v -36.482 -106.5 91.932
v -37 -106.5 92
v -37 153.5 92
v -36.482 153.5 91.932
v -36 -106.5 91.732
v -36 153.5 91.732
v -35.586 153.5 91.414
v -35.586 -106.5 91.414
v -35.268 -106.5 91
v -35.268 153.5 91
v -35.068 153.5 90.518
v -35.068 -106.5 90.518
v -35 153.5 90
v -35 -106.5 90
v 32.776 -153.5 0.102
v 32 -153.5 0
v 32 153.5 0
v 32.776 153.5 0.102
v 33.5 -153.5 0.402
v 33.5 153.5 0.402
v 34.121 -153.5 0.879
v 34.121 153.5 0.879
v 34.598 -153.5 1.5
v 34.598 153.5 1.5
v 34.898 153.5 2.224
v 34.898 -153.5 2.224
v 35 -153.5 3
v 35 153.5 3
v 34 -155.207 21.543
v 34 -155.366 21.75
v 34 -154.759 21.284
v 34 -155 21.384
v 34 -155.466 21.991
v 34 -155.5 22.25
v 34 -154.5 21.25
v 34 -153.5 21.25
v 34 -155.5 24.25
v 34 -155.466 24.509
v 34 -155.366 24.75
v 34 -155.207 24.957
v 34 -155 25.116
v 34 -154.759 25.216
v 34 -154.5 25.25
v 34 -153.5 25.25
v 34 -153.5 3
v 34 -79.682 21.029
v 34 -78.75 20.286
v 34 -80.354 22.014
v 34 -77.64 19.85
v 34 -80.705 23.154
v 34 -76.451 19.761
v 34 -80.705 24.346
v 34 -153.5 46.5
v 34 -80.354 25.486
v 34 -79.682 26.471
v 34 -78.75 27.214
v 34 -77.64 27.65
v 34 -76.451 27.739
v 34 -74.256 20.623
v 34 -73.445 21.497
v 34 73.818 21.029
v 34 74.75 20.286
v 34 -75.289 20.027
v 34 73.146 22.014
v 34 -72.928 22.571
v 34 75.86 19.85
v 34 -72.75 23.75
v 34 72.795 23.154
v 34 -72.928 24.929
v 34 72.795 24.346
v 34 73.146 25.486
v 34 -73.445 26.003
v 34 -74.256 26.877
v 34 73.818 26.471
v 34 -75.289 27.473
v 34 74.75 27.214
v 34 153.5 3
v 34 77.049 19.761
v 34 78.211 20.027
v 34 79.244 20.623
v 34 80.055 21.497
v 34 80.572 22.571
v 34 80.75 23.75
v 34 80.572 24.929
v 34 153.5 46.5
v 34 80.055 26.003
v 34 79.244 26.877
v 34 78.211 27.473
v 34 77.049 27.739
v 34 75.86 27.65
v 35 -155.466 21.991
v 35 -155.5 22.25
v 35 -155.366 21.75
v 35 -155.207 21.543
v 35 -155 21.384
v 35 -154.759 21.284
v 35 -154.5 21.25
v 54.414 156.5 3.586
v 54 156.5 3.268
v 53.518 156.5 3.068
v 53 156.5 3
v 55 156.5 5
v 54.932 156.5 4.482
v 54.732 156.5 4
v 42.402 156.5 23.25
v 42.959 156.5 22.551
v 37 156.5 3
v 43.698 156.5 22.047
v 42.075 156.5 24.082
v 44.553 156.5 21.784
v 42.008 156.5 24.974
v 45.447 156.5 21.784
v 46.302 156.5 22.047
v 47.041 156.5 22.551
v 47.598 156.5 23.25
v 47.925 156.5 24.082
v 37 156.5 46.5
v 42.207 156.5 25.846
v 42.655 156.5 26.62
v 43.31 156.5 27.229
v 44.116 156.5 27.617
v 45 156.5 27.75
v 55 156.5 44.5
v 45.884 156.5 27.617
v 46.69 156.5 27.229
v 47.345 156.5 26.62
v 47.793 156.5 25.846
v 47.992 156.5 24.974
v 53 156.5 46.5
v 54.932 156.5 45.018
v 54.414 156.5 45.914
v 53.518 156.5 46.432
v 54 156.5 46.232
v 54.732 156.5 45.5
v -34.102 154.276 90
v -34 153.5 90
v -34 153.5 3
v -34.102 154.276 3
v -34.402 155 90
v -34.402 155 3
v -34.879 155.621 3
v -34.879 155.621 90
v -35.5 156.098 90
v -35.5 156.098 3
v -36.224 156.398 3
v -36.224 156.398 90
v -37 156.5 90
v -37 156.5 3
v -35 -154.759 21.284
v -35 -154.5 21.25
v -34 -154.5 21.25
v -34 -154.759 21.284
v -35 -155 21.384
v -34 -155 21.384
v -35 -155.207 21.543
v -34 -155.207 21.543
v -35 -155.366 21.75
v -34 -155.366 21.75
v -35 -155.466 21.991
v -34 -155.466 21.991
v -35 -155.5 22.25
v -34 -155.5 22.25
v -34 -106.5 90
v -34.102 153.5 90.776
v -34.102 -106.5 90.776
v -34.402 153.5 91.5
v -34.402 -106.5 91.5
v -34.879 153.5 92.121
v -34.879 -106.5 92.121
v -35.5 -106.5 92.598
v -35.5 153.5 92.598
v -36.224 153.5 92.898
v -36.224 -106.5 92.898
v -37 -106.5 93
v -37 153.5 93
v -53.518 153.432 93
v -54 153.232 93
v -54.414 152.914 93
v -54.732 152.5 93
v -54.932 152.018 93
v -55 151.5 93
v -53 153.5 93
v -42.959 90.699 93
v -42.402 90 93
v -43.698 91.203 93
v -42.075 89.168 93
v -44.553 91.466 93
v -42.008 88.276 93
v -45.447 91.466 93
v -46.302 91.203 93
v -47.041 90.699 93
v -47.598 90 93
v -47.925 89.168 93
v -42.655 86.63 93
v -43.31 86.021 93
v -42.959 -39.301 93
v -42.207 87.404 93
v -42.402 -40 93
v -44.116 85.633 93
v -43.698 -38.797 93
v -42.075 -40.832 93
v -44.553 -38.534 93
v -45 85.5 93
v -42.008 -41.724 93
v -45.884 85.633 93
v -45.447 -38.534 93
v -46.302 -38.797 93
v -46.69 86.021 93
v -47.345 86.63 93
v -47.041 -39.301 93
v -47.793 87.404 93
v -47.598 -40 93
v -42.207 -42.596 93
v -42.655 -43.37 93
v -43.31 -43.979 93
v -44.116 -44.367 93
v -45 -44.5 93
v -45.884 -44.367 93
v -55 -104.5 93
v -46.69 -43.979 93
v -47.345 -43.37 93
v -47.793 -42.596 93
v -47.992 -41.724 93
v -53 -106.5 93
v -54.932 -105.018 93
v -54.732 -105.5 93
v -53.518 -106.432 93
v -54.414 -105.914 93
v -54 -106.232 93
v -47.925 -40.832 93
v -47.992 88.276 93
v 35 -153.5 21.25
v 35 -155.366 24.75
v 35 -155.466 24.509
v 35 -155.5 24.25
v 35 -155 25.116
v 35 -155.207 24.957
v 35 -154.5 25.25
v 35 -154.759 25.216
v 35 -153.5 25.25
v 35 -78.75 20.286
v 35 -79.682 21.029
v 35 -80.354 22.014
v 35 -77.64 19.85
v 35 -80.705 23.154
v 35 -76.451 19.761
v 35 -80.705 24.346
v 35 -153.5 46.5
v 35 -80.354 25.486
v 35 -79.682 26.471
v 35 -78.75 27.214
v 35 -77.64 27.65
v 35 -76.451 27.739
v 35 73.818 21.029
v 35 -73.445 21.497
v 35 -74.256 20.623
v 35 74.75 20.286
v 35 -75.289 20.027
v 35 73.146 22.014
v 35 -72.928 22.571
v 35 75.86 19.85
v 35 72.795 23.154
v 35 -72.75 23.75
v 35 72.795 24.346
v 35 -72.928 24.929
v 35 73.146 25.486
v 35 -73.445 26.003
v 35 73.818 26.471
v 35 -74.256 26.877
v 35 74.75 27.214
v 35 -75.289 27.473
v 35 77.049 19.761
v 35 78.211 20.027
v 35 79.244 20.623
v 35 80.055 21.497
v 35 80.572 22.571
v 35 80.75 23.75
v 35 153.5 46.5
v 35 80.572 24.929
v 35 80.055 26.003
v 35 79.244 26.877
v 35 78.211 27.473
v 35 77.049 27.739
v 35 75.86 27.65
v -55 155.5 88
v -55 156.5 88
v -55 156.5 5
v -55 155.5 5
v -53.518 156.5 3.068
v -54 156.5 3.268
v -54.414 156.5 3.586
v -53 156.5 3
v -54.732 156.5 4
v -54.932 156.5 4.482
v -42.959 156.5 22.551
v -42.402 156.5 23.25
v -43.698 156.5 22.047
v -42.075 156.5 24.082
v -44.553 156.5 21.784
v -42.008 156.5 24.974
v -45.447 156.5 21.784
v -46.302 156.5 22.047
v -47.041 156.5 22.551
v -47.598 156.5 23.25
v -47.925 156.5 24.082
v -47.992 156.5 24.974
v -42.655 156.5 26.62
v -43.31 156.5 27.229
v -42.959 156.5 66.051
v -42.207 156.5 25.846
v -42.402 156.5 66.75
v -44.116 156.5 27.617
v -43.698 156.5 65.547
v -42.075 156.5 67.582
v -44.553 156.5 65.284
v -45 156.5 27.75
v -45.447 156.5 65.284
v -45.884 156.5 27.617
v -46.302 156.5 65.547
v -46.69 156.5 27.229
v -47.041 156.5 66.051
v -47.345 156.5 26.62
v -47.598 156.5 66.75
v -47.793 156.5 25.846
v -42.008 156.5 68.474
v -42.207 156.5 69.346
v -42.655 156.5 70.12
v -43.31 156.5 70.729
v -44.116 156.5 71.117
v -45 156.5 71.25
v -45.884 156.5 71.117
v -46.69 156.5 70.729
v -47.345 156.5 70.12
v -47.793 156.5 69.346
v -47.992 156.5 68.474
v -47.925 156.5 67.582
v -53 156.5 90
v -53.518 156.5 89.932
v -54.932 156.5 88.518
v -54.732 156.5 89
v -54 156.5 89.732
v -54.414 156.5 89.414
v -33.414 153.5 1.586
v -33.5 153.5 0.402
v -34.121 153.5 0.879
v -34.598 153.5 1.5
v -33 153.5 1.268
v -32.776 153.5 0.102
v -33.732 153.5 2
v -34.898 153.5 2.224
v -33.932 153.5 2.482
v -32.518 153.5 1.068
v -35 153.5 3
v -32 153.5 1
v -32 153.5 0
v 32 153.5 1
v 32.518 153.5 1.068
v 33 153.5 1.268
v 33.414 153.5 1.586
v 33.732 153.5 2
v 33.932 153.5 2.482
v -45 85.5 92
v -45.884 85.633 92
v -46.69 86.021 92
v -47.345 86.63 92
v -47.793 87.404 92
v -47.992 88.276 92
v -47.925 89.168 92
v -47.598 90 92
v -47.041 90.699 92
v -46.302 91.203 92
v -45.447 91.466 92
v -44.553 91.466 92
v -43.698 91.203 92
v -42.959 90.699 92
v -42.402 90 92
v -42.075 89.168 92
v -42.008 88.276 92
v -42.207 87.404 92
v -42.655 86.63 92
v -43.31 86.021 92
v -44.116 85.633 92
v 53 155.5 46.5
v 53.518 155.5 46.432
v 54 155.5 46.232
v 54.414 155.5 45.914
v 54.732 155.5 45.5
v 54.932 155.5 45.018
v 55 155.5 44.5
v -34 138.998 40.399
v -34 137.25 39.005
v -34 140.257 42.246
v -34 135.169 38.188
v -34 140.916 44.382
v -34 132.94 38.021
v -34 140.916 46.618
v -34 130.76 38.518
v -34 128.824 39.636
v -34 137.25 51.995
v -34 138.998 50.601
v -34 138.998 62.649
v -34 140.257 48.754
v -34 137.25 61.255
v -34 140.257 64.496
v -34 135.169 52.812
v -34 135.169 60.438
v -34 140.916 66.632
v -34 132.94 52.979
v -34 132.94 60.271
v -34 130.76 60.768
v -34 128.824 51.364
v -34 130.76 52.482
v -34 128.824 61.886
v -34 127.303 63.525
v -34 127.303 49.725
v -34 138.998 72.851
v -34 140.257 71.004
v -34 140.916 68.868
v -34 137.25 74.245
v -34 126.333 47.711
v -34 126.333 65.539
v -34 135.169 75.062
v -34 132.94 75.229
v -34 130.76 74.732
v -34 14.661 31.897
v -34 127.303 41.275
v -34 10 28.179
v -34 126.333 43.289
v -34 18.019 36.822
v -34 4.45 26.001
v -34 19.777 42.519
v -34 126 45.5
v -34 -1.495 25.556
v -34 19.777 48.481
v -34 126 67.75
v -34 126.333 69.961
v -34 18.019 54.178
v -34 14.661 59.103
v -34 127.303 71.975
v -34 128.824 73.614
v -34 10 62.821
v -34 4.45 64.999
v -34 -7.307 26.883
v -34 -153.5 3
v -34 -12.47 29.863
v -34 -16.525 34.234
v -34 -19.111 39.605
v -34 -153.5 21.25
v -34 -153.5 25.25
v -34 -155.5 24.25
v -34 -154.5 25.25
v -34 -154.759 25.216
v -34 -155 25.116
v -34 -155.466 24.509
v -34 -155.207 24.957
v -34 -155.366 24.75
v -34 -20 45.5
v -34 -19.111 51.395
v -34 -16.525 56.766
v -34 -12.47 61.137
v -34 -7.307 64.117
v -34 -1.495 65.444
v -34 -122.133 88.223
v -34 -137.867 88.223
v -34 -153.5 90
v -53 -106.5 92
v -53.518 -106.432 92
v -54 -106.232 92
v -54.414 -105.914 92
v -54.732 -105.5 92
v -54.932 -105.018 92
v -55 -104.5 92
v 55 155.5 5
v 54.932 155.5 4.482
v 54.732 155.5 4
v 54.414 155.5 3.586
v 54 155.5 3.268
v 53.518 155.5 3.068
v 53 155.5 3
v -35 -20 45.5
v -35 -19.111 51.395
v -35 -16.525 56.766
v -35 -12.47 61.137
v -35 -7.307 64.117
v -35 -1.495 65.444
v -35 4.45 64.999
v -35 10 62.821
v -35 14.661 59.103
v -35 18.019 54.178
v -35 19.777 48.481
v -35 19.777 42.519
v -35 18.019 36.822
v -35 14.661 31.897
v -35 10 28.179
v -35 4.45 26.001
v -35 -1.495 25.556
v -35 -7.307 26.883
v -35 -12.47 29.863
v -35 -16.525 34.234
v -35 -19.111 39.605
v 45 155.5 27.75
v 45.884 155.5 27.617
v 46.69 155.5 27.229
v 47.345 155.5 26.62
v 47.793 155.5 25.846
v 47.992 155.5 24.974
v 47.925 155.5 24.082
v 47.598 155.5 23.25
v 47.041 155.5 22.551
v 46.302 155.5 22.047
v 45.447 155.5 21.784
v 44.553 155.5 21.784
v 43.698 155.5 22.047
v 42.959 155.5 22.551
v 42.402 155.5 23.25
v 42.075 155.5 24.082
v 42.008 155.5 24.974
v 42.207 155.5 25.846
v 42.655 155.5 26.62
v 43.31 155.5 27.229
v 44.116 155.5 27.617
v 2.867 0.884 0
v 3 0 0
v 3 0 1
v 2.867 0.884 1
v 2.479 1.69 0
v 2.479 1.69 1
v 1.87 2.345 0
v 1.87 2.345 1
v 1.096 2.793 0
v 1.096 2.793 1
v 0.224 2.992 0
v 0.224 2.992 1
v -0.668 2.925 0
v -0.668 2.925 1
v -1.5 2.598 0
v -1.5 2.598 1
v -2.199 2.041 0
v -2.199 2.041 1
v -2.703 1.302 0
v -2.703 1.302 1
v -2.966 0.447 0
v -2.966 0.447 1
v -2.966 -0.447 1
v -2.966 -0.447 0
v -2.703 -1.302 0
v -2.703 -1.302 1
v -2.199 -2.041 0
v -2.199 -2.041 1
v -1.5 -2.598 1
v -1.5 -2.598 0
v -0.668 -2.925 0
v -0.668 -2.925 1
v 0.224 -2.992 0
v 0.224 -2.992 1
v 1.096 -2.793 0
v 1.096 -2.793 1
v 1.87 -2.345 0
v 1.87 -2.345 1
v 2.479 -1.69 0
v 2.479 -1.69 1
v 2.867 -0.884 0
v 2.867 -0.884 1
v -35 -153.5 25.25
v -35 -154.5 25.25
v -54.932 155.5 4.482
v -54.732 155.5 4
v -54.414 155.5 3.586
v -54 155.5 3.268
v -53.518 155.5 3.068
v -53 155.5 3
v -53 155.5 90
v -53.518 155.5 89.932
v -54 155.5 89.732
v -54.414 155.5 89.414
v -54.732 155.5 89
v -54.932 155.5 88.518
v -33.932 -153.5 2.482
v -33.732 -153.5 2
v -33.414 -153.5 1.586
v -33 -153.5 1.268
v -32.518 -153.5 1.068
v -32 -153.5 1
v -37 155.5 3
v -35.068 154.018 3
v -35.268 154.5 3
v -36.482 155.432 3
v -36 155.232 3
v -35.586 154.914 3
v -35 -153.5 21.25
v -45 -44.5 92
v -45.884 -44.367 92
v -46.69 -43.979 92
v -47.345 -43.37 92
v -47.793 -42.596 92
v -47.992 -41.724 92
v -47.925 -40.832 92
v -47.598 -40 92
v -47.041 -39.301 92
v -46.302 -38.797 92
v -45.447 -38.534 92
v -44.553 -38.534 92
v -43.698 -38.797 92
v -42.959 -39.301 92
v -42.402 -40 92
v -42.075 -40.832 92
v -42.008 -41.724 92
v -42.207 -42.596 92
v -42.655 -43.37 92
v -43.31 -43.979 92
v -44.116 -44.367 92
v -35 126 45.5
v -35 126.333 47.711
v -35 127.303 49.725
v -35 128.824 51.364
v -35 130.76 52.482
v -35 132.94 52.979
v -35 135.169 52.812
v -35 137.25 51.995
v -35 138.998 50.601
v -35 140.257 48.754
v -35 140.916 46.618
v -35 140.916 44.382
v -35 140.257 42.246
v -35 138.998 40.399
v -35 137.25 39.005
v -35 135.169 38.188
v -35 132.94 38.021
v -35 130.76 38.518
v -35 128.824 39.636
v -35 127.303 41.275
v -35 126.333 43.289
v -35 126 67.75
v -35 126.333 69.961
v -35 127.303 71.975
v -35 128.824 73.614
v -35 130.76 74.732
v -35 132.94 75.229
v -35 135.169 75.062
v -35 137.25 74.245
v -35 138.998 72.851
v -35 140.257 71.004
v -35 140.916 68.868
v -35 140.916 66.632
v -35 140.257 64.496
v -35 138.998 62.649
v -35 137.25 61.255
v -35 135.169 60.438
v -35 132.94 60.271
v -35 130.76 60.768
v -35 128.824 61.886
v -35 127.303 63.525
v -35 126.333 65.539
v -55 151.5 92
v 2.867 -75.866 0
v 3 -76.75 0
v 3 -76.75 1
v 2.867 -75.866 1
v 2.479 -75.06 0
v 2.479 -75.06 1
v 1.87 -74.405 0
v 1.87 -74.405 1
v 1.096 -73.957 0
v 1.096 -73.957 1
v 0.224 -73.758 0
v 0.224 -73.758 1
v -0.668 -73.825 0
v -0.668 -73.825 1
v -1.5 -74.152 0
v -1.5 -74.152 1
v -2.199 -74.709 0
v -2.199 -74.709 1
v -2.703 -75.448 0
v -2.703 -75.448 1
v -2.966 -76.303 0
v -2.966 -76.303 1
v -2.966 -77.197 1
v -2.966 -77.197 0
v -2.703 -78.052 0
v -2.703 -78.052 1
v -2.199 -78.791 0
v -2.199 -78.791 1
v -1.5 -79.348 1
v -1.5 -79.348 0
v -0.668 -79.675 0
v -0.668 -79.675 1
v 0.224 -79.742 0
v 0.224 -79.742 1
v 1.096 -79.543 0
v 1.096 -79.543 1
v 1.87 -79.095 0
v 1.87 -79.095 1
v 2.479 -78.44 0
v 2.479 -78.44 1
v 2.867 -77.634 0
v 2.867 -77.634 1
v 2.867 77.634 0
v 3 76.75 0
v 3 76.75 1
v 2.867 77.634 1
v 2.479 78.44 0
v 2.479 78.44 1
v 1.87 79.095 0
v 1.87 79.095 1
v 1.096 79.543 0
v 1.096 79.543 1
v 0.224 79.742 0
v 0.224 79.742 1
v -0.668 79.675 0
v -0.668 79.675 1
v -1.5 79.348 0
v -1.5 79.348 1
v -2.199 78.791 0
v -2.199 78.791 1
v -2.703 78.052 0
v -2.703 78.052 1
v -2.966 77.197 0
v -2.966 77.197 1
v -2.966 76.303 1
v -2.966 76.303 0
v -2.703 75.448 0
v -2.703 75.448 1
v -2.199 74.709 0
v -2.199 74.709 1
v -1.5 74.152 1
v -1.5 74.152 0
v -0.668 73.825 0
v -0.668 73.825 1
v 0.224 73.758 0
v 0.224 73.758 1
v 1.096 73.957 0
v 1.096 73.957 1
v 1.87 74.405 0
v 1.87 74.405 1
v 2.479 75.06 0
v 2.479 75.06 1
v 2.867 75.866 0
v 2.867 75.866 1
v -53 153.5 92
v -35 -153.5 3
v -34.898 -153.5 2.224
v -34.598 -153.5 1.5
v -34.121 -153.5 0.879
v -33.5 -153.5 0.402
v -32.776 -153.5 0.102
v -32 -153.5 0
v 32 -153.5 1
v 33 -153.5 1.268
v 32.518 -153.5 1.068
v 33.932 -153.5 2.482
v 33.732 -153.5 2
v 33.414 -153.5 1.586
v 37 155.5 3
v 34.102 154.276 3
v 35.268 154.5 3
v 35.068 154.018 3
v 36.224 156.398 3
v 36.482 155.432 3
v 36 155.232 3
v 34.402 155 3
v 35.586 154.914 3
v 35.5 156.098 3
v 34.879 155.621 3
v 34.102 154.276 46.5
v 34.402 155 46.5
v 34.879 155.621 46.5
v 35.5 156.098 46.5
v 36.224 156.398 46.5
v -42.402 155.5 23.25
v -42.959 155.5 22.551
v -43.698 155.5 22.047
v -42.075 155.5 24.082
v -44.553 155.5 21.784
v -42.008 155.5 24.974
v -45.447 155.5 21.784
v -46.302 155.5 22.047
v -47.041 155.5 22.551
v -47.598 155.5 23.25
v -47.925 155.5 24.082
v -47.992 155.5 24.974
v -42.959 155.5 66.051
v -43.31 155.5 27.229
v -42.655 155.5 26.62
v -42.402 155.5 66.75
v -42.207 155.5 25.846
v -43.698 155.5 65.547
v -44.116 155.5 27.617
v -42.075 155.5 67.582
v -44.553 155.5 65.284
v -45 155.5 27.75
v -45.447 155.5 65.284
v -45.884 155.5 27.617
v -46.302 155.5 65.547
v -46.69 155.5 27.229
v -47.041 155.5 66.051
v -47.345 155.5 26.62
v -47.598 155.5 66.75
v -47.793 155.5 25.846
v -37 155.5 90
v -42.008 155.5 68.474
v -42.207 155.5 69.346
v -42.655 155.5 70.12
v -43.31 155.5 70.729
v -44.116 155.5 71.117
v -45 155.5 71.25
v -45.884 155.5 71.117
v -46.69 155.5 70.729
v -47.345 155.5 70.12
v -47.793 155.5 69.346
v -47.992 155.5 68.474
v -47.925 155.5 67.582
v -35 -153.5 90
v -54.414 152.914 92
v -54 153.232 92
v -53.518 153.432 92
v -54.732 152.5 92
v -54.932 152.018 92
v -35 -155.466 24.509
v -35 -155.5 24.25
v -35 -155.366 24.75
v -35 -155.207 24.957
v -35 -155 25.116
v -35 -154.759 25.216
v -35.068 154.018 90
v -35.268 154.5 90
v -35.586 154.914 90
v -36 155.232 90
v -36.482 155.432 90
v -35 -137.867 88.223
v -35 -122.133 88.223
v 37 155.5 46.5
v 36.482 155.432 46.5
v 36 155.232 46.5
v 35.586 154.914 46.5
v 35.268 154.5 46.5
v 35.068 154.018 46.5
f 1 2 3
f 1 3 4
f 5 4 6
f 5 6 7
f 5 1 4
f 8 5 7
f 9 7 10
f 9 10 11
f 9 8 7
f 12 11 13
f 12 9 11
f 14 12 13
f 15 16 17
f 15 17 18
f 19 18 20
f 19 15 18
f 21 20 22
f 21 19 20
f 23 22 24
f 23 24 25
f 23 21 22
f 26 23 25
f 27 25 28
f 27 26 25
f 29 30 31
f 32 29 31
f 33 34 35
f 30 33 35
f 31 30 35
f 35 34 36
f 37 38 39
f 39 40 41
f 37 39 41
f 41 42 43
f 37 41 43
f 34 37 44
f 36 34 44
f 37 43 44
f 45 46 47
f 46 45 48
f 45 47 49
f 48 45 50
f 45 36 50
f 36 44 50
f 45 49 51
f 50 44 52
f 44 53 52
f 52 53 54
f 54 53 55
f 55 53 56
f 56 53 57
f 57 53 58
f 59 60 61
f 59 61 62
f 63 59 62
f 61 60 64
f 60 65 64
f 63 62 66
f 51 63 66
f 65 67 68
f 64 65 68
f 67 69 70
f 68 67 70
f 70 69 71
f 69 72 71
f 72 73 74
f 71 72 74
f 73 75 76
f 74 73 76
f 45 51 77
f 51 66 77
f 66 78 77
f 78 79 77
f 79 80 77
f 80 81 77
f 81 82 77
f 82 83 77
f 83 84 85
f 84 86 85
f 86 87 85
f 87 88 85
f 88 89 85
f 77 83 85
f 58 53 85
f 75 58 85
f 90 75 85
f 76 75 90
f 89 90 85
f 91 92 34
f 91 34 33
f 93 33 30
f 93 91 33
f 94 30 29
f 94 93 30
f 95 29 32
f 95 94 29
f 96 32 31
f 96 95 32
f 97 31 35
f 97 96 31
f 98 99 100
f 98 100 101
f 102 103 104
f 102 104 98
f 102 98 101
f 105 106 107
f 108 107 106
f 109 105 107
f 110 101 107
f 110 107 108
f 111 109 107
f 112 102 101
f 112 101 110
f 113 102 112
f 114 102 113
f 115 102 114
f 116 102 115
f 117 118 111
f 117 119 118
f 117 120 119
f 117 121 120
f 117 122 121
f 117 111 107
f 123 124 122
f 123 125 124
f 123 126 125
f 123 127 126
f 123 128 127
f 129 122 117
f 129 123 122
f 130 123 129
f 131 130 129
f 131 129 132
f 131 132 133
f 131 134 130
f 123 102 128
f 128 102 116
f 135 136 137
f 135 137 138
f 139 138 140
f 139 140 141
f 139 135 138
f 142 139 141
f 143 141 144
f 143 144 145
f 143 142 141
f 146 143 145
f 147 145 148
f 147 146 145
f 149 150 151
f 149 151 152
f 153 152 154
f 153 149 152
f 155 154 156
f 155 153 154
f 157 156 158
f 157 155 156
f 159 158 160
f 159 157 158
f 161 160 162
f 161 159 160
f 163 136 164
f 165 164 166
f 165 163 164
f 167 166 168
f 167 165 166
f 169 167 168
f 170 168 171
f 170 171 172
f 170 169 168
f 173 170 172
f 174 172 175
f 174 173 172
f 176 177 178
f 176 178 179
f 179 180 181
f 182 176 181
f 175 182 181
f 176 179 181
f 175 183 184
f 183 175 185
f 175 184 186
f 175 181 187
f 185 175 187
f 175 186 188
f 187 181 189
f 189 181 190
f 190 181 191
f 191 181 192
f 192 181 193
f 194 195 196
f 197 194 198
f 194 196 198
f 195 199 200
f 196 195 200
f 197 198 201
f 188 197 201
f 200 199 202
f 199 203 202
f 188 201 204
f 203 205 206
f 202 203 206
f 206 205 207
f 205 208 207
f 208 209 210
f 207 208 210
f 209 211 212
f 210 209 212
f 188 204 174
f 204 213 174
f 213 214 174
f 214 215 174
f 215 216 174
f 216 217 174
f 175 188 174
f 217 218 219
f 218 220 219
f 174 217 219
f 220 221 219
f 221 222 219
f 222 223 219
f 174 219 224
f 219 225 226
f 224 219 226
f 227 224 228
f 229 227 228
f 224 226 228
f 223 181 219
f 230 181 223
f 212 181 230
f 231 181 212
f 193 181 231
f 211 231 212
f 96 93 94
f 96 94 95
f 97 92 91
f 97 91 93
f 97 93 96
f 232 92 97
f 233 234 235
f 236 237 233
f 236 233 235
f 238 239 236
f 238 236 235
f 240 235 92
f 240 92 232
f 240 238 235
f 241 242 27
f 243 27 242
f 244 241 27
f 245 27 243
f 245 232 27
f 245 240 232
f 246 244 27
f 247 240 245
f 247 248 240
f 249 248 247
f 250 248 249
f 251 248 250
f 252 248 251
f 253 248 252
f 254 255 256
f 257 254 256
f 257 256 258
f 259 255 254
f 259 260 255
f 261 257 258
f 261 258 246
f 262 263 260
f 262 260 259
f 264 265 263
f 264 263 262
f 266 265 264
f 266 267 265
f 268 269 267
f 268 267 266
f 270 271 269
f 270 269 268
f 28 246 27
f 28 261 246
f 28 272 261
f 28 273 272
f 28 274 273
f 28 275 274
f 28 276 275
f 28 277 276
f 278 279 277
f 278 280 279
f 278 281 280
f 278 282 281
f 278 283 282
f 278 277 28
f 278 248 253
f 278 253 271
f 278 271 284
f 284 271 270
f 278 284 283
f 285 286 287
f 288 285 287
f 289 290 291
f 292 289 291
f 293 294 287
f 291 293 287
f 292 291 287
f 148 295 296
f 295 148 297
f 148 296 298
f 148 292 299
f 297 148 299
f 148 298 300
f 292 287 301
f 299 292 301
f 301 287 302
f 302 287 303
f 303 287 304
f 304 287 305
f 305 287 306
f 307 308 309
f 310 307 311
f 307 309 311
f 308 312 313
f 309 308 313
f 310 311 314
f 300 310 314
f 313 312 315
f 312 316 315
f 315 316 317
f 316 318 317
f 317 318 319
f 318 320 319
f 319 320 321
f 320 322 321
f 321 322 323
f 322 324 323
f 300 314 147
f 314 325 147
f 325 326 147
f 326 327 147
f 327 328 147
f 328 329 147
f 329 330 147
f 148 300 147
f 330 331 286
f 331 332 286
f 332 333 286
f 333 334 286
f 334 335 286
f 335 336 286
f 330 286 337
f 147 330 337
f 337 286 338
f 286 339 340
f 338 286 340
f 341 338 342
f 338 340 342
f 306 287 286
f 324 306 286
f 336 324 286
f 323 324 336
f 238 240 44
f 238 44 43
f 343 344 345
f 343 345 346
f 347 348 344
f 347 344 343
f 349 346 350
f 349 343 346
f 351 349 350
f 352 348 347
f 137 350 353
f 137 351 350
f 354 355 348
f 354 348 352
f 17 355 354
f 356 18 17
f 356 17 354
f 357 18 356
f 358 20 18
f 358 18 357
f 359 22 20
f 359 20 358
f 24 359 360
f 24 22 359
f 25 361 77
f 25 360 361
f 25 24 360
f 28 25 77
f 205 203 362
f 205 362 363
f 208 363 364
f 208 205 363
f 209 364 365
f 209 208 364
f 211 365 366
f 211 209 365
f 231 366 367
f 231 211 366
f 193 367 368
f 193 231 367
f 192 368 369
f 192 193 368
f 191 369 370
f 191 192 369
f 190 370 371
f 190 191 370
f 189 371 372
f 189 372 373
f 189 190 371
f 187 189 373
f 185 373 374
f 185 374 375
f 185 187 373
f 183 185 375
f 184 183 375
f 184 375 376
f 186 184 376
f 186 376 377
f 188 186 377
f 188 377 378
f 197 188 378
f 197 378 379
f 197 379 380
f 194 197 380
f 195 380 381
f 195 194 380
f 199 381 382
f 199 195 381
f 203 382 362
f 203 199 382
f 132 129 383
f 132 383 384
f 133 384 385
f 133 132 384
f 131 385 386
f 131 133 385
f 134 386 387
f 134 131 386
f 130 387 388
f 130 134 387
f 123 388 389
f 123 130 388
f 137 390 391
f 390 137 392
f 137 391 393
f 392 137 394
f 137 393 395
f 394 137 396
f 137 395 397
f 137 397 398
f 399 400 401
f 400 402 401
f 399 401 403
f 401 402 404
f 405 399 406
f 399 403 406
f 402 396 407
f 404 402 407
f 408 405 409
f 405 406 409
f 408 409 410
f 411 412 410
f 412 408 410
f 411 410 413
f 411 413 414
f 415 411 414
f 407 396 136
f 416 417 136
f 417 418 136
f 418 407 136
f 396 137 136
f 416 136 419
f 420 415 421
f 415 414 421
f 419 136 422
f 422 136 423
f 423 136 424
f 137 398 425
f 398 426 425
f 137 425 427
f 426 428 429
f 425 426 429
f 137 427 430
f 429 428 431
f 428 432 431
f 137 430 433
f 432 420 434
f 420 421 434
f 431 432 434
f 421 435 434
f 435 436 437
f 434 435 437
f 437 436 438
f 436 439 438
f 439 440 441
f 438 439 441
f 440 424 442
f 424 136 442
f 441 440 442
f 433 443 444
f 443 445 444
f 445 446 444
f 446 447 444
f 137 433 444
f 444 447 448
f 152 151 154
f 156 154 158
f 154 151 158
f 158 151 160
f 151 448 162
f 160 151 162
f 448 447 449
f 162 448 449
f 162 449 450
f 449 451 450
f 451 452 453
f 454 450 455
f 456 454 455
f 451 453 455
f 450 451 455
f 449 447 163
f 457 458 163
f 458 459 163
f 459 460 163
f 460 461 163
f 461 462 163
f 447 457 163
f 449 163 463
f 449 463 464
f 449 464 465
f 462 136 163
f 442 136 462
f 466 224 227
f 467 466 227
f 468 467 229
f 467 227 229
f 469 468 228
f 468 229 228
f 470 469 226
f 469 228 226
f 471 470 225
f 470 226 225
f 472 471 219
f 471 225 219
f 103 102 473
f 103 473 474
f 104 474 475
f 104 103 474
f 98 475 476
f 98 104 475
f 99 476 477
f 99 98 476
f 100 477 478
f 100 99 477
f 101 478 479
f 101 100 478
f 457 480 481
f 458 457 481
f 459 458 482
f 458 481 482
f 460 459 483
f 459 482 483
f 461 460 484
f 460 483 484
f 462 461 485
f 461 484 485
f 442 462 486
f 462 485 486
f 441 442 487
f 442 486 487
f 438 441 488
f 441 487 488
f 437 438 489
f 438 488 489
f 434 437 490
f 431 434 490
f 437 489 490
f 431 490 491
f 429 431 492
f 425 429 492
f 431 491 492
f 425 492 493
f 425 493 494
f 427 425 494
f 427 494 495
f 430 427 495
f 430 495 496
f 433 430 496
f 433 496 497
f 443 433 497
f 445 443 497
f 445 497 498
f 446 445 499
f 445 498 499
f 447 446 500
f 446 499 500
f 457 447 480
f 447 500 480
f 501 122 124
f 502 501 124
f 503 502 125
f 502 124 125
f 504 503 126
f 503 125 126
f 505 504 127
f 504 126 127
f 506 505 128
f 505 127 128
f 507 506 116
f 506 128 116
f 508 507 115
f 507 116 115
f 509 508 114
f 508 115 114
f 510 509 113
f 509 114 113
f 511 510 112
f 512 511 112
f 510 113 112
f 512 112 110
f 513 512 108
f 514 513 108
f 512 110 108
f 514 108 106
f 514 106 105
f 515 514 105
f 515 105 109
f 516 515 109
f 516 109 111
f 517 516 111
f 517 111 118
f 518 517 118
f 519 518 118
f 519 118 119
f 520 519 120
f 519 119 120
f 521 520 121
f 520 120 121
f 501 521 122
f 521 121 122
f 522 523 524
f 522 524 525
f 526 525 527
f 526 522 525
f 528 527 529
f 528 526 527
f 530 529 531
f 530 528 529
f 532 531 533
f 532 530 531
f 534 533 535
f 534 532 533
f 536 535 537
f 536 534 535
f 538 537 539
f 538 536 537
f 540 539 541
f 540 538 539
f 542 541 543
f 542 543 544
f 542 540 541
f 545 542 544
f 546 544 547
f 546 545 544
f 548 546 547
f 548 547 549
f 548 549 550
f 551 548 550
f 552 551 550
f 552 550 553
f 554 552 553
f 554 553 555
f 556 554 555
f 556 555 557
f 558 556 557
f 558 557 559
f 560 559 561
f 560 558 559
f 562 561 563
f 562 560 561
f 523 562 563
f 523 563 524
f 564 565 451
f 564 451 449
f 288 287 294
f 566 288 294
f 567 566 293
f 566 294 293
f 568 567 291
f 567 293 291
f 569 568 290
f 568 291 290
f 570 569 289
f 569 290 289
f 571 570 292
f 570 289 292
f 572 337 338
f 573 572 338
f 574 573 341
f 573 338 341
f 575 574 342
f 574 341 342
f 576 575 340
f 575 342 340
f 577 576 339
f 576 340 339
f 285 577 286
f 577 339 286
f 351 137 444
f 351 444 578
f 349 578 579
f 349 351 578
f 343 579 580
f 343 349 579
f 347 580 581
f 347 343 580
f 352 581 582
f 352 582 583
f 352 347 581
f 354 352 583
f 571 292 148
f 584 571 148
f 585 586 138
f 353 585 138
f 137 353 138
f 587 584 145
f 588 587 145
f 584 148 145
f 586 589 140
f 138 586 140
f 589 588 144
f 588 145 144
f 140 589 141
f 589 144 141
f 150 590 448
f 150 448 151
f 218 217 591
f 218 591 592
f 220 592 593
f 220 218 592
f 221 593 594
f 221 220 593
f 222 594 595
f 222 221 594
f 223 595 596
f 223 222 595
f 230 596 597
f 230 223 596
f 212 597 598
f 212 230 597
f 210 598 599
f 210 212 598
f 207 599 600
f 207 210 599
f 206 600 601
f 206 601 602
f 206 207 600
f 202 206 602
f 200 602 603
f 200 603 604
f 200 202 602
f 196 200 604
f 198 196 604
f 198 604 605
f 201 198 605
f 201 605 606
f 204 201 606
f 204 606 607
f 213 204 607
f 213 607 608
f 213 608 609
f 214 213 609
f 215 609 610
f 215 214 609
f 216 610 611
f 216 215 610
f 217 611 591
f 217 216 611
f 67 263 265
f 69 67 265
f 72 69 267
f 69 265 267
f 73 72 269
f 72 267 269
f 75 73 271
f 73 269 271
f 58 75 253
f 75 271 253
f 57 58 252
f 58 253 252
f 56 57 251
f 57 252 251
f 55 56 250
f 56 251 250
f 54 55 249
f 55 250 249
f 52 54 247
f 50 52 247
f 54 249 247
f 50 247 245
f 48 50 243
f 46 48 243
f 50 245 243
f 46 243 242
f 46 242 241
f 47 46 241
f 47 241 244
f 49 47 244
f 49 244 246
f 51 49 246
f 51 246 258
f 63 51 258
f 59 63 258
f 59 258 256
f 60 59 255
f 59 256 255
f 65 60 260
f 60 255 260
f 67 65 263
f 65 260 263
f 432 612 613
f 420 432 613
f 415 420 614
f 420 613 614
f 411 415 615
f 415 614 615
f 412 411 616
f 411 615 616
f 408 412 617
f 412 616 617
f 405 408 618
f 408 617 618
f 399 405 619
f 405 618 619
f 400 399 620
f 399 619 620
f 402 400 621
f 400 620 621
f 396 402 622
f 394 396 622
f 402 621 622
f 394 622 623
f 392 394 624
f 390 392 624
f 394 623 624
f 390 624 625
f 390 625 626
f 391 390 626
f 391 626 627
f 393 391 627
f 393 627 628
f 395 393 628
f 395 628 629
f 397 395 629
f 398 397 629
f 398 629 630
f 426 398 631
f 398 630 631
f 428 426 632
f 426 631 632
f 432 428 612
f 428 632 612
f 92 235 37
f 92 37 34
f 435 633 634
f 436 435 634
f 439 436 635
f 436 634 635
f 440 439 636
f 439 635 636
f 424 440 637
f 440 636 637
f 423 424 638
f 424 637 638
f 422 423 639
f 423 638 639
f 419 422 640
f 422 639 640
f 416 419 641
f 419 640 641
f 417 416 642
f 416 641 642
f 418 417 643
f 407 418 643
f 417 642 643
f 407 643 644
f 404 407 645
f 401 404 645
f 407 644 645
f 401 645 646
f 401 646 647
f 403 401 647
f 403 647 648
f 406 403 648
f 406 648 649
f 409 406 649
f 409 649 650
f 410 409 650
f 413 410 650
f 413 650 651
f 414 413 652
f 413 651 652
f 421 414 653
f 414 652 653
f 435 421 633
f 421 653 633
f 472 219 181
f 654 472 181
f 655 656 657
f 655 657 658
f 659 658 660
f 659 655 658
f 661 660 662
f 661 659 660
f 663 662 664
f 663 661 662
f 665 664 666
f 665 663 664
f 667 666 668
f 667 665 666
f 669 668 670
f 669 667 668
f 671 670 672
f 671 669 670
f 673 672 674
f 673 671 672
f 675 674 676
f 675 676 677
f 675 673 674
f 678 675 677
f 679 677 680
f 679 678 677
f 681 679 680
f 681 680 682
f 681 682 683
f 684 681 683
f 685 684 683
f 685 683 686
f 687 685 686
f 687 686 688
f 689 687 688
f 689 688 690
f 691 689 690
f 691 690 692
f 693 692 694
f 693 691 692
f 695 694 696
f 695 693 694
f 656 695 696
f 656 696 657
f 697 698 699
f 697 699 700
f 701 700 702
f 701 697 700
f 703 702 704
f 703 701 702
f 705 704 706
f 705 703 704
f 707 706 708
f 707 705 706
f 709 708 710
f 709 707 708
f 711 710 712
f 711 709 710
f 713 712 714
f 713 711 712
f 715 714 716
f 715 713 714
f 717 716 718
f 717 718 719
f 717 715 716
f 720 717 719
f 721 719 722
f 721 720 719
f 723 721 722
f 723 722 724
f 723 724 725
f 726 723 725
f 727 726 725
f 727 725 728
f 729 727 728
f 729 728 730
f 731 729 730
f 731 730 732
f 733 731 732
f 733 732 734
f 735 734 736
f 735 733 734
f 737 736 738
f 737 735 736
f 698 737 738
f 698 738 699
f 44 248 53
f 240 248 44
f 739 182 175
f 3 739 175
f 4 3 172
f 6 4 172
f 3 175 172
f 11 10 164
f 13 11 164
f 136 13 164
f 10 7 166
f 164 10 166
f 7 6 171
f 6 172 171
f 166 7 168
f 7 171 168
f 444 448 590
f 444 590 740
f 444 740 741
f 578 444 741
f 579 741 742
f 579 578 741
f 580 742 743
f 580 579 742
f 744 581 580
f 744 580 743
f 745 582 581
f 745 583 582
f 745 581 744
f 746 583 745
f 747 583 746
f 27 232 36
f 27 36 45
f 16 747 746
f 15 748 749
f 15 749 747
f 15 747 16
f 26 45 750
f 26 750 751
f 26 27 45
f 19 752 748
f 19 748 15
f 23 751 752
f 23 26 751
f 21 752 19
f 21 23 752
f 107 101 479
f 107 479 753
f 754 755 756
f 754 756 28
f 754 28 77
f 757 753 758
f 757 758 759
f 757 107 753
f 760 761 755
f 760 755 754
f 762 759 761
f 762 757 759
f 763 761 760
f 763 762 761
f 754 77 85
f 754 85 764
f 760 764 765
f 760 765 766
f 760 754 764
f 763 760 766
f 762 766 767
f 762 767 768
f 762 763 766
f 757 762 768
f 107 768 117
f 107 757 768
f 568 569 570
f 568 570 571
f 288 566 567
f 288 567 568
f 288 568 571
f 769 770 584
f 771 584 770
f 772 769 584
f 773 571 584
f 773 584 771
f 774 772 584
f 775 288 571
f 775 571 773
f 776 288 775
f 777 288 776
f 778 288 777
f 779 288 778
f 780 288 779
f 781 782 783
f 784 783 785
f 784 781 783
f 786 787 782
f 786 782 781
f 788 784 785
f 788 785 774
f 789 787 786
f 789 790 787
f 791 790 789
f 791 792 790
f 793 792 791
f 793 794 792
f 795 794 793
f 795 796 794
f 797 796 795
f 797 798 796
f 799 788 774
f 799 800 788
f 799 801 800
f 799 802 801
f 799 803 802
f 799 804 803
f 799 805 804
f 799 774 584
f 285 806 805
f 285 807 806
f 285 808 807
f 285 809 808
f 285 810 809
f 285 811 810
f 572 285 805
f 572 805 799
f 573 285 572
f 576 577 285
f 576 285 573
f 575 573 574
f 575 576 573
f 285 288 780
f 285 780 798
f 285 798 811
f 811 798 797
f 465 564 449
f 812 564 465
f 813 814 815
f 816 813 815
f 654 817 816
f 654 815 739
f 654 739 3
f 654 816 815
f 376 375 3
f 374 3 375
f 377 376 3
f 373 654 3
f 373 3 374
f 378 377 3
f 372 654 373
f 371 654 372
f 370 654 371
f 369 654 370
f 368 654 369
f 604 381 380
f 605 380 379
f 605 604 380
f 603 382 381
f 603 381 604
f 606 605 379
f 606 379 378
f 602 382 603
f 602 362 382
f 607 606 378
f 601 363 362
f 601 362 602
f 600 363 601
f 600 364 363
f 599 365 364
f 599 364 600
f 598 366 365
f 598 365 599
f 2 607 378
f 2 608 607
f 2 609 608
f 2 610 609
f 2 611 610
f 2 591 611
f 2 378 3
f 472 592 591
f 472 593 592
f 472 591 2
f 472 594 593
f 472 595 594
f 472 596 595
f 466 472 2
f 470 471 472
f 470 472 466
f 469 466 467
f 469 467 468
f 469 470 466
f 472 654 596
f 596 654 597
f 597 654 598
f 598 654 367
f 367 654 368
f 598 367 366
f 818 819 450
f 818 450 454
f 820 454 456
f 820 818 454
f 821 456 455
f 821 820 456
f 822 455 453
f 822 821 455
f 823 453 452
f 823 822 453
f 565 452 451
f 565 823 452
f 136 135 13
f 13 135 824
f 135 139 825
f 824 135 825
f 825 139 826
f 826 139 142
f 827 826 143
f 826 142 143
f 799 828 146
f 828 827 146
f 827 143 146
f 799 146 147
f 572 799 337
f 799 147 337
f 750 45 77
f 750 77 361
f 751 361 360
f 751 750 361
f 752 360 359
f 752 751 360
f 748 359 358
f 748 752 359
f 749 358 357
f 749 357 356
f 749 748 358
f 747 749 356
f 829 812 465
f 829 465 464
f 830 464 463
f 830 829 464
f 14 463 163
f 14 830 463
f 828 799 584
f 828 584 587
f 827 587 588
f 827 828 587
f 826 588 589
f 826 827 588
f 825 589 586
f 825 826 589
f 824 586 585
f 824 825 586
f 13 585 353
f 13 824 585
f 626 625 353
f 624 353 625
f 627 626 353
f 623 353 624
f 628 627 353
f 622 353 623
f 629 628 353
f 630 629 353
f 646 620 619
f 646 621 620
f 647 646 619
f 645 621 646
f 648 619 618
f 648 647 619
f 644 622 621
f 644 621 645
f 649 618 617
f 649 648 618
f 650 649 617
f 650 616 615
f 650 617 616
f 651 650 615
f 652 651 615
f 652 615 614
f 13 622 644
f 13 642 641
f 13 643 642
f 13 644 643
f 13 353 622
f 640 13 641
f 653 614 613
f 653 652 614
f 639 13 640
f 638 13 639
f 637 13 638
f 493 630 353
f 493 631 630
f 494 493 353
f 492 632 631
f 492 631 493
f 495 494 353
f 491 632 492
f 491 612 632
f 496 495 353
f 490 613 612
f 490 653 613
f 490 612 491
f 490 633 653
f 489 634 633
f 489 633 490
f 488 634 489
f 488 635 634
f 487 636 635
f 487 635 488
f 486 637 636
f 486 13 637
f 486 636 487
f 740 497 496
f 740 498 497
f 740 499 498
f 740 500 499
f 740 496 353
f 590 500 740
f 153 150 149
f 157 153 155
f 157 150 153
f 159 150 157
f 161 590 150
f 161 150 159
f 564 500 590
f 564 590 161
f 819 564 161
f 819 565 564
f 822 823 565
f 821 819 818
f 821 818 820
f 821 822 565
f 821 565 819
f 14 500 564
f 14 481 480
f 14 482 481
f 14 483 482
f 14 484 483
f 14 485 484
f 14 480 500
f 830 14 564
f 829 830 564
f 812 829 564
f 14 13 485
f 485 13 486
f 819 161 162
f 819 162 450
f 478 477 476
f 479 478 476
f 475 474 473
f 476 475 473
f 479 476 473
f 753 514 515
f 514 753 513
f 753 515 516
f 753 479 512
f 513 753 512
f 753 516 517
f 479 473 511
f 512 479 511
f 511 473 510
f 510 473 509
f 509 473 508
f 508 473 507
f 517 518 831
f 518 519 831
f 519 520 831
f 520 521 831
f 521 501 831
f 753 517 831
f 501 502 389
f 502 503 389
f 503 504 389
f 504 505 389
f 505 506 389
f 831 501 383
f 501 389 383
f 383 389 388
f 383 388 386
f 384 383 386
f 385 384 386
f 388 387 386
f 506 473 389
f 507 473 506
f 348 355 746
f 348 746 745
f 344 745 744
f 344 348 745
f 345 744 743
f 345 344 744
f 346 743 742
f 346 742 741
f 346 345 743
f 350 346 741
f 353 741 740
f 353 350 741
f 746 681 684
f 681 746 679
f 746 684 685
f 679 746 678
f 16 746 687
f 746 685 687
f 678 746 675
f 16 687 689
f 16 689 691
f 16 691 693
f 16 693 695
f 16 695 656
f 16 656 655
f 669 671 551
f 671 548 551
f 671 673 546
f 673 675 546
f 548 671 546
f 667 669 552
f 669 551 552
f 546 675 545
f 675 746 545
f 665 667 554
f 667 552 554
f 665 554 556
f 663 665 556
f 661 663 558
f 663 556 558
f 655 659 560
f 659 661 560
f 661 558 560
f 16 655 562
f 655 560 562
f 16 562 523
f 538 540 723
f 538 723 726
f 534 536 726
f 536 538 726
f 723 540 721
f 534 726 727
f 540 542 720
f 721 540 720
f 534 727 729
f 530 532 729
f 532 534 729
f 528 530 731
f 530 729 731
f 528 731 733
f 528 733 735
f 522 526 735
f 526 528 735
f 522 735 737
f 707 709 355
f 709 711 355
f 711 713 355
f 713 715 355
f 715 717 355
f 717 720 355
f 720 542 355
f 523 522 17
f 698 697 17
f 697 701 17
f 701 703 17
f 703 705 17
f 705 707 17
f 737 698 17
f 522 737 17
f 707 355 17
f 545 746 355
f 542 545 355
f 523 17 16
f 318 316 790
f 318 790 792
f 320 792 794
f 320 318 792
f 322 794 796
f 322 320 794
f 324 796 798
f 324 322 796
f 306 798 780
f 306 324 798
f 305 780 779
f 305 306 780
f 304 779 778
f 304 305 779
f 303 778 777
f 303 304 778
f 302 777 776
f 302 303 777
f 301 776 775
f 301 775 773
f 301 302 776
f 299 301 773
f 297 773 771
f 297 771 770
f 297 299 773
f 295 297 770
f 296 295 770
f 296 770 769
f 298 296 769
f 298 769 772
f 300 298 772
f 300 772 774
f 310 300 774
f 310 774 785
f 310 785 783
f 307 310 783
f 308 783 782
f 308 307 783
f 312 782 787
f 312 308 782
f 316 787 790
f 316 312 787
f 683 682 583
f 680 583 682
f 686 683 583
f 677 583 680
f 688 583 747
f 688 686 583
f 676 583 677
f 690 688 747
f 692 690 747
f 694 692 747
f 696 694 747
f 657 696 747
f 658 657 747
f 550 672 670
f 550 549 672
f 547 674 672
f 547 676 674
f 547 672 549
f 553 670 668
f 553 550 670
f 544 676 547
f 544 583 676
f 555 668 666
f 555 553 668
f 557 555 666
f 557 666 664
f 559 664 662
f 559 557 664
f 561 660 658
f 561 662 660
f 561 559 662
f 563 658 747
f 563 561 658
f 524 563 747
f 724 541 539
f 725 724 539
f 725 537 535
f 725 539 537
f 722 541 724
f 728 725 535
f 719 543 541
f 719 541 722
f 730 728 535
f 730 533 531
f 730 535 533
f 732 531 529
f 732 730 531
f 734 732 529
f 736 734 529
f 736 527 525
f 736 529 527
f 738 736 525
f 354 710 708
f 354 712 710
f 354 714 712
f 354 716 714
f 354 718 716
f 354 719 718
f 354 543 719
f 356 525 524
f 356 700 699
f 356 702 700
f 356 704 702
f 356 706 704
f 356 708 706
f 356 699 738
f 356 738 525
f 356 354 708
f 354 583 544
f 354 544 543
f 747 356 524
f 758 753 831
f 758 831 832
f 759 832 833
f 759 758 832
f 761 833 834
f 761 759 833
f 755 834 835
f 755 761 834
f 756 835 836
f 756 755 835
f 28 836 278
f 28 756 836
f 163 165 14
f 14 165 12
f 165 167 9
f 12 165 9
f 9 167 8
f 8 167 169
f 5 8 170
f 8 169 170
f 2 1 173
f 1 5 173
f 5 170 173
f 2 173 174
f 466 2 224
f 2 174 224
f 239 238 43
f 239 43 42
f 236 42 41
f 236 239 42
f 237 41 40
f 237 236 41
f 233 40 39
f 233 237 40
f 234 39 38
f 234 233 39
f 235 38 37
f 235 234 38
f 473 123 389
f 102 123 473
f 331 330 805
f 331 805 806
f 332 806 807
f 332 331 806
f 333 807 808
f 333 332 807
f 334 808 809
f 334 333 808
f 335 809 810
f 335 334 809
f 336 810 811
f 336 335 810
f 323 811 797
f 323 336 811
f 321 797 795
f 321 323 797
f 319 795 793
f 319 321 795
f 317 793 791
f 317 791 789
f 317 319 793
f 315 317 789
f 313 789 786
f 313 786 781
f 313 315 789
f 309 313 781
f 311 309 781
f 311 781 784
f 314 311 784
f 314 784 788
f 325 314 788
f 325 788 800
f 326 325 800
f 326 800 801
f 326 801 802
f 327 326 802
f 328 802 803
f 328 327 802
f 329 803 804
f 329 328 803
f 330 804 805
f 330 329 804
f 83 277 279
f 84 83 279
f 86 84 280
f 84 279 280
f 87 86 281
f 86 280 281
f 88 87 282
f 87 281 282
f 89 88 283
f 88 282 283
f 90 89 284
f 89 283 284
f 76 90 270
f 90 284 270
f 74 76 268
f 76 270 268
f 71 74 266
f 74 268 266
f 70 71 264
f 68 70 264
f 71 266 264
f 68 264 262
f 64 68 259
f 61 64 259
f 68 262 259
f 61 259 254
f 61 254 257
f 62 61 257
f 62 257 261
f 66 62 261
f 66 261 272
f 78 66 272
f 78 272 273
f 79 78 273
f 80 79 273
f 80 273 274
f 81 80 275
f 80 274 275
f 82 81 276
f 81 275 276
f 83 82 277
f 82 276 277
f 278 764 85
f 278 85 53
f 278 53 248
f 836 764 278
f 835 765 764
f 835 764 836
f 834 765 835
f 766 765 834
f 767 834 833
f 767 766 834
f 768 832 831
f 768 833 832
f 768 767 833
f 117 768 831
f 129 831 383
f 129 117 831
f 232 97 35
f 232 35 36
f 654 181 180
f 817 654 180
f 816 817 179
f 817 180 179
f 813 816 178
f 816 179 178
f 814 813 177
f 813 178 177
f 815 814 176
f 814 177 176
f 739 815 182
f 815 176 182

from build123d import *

# Parameters (mm, degrees)
SKETCH1_W                = 64
SKETCH1_H                = 307
SKETCH1_R                = 3
BOSS_EXTRUDE1_DEPTH      = 1
EDGE_FLANGE1_DEPTH       = 307
EDGE_FLANGE1_START       = 1
EDGE_FLANGE1_PROFILE_R   = 7.5
EDGE_FLANGE1_PROFILE_R_2 = 20
EDGE_FLANGE1_FLAT_DEPTH  = 1
EDGE_FLANGE2_DEPTH       = 260
EDGE_FLANGE2_START       = -1
EDGE_FLANGE2_PROFILE_R   = 3
EDGE_FLANGE2_FLAT_DEPTH  = 1
EDGE_FLANGE3_DEPTH       = 87
EDGE_FLANGE3_START       = -1
EDGE_FLANGE3_PROFILE_R   = 3
EDGE_FLANGE3_FLAT_DEPTH  = 1
EDGE_FLANGE4_DEPTH       = 307
EDGE_FLANGE4_START       = 1
EDGE_FLANGE4_PROFILE_R   = 4
EDGE_FLANGE4_FLAT_DEPTH  = 1
EDGE_FLANGE5_DEPTH       = 43.5
EDGE_FLANGE5_START       = 1
EDGE_FLANGE5_PROFILE_R   = 3
EDGE_FLANGE5_FLAT_DEPTH  = 1


# Sheet-metal steps are written as plain solids
with BuildPart() as part:
    # Sketch1 → Boss-Extrude1 (new body)
    with BuildSketch(Plane.XY):
        Rectangle(SKETCH1_W, SKETCH1_H)
        Circle(SKETCH1_R, mode=Mode.SUBTRACT)
        with Locations((0, 76.75)):
            Circle(SKETCH1_R, mode=Mode.SUBTRACT)
        with Locations((0, -76.75)):
            Circle(SKETCH1_R, mode=Mode.SUBTRACT)
    extrude(amount=BOSS_EXTRUDE1_DEPTH)

    # Edge-Flange1 bend section (across the edge) → Edge-Flange1 (add)
    with BuildSketch(Plane(origin=(-34, 153.5, 1), x_dir=(1, 0, 0), z_dir=(0, -1, 0))):
        with BuildLine():
            Line((-1, 2), (0, 2))
            ThreePointArc((0, 2), (0.585786438, 0.585786438), (2, 0))
            Line((2, 0), (2, -1))
            ThreePointArc((2, -1), (-0.121320344, -0.121320344), (-1, 2))
        make_face()
    extrude(amount=EDGE_FLANGE1_DEPTH)

    # Edge-Flange1 profile (on flange) → Edge-Flange1 flat (add)
    with BuildSketch(Plane(origin=(-34, 0, 1), x_dir=(0, -1, 0), z_dir=(-1, 0, 0)).offset(EDGE_FLANGE1_START)):
        with BuildLine():
            Line((-153.5, 89), (-153.5, 2))
            Line((-153.5, 2), (153.5, 2))
            Line((153.5, 2), (153.5, 20.25))
            Line((153.5, 20.25), (154.5, 20.25))
            ThreePointArc((154.5, 20.25), (155.207106781, 20.542893219), (155.5, 21.25))
            Line((155.5, 21.25), (155.5, 23.25))
            ThreePointArc((155.5, 23.25), (155.207106781, 23.957106781), (154.5, 24.25))
            Line((154.5, 24.25), (153.5, 24.25))
            Line((153.5, 24.25), (153.5, 89))
            ThreePointArc((153.5, 89), (130, 87), (106.5, 89))
            Line((106.5, 89), (-153.5, 89))
        make_face()
        with Locations((-133.5, 44.5)):
            Circle(EDGE_FLANGE1_PROFILE_R, mode=Mode.SUBTRACT)
        with Locations((0, 44.5)):
            Circle(EDGE_FLANGE1_PROFILE_R_2, mode=Mode.SUBTRACT)
        with Locations((-133.5, 66.75)):
            Circle(EDGE_FLANGE1_PROFILE_R, mode=Mode.SUBTRACT)
    extrude(amount=-EDGE_FLANGE1_FLAT_DEPTH)

    # Edge-Flange2 bend section (across the edge) → Edge-Flange2 (add)
    with BuildSketch(Plane(origin=(-35, -106.5, 92), x_dir=(0, 0, -1), z_dir=(0, 1, 0))):
        with BuildLine():
            Line((-1, 2), (0, 2))
            ThreePointArc((0, 2), (0.585786438, 0.585786438), (2, 0))
            Line((2, 0), (2, -1))
            ThreePointArc((2, -1), (-0.121320344, -0.121320344), (-1, 2))
        make_face()
    extrude(amount=EDGE_FLANGE2_DEPTH)

    # Edge-Flange2 profile (on flange) → Edge-Flange2 flat (add)
    with BuildSketch(Plane(origin=(-35, 0, 92), x_dir=(0, -1, 0), z_dir=(0, 0, -1)).offset(EDGE_FLANGE2_START)):
        with BuildLine():
            Line((-153.5, 2), (106.5, 2))
            Line((106.5, 2), (106.5, 18))
            ThreePointArc((106.5, 18), (105.914213562, 19.414213562), (104.5, 20))
            Line((104.5, 20), (-151.5, 20))
            ThreePointArc((-151.5, 20), (-152.914213562, 19.414213562), (-153.5, 18))
            Line((-153.5, 18), (-153.5, 2))
        make_face()
        with Locations((41.5, 10)):
            Circle(EDGE_FLANGE2_PROFILE_R, mode=Mode.SUBTRACT)
        with Locations((-88.5, 10)):
            Circle(EDGE_FLANGE2_PROFILE_R, mode=Mode.SUBTRACT)
    extrude(amount=EDGE_FLANGE2_FLAT_DEPTH)

    # Edge-Flange3 bend section (across the edge) → Edge-Flange3 (add)
    with BuildSketch(Plane(origin=(-35, 155.5, 90), x_dir=(0, -1, 0), z_dir=(0, 0, -1))):
        with BuildLine():
            Line((-1, 2), (0, 2))
            ThreePointArc((0, 2), (0.585786438, 0.585786438), (2, 0))
            Line((2, 0), (2, -1))
            ThreePointArc((2, -1), (-0.121320344, -0.121320344), (-1, 2))
        make_face()
    extrude(amount=EDGE_FLANGE3_DEPTH)

    # Edge-Flange3 profile (on flange) → Edge-Flange3 flat (add)
    with BuildSketch(Plane(origin=(-35, 155.5, 0), x_dir=(0, 0, 1), z_dir=(0, -1, 0)).offset(EDGE_FLANGE3_START)):
        with BuildLine():
            Line((3, 2), (90, 2))
            Line((90, 2), (90, 18))
            ThreePointArc((90, 18), (89.414213562, 19.414213562), (88, 20))
            Line((88, 20), (5, 20))
            ThreePointArc((5, 20), (3.585786438, 19.414213562), (3, 18))
            Line((3, 18), (3, 2))
        make_face()
        with Locations((24.75, 10)):
            Circle(EDGE_FLANGE3_PROFILE_R, mode=Mode.SUBTRACT)
        with Locations((68.25, 10)):
            Circle(EDGE_FLANGE3_PROFILE_R, mode=Mode.SUBTRACT)
    extrude(amount=EDGE_FLANGE3_FLAT_DEPTH)

    # Edge-Flange4 bend section (across the edge) → Edge-Flange4 (add)
    with BuildSketch(Plane(origin=(34, -153.5, 1), x_dir=(-1, 0, 0), z_dir=(0, 1, 0))):
        with BuildLine():
            Line((-1, 2), (0, 2))
            ThreePointArc((0, 2), (0.585786438, 0.585786438), (2, 0))
            Line((2, 0), (2, -1))
            ThreePointArc((2, -1), (-0.121320344, -0.121320344), (-1, 2))
        make_face()
    extrude(amount=EDGE_FLANGE4_DEPTH)

    # Edge-Flange4 profile (on flange) → Edge-Flange4 flat (add)
    with BuildSketch(Plane(origin=(34, 0, 1), x_dir=(0, 1, 0), z_dir=(1, 0, 0)).offset(EDGE_FLANGE4_START)):
        with BuildLine():
            ThreePointArc((-155.5, 21.25), (-155.207106781, 20.542893219), (-154.5, 20.25))
            Line((-154.5, 20.25), (-153.5, 20.25))
            Line((-153.5, 20.25), (-153.5, 2))
            Line((-153.5, 2), (153.5, 2))
            Line((153.5, 2), (153.5, 45.5))
            Line((153.5, 45.5), (-153.5, 45.5))
            Line((-153.5, 45.5), (-153.5, 24.25))
            Line((-153.5, 24.25), (-154.5, 24.25))
            ThreePointArc((-154.5, 24.25), (-155.207106781, 23.957106781), (-155.5, 23.25))
            Line((-155.5, 23.25), (-155.5, 21.25))
        make_face()
        with Locations((-76.75, 22.75)):
            Circle(EDGE_FLANGE4_PROFILE_R, mode=Mode.SUBTRACT)
        with Locations((76.75, 22.75)):
            Circle(EDGE_FLANGE4_PROFILE_R, mode=Mode.SUBTRACT)
    extrude(amount=-EDGE_FLANGE4_FLAT_DEPTH)

    # Edge-Flange5 bend section (across the edge) → Edge-Flange5 (add)
    with BuildSketch(Plane(origin=(35, 155.5, 3), x_dir=(0, -1, 0), z_dir=(0, 0, 1))):
        with BuildLine():
            Line((-1, 2), (0, 2))
            ThreePointArc((0, 2), (0.585786438, 0.585786438), (2, 0))
            Line((2, 0), (2, -1))
            ThreePointArc((2, -1), (-0.121320344, -0.121320344), (-1, 2))
        make_face()
    extrude(amount=EDGE_FLANGE5_DEPTH)

    # Edge-Flange5 profile (on flange) → Edge-Flange5 flat (add)
    with BuildSketch(Plane(origin=(35, 155.5, 0), x_dir=(0, 0, 1), z_dir=(0, 1, 0)).offset(EDGE_FLANGE5_START)):
        with BuildLine():
            ThreePointArc((5, 20), (3.585786438, 19.414213562), (3, 18))
            Line((3, 18), (3, 2))
            Line((3, 2), (46.5, 2))
            Line((46.5, 2), (46.5, 18))
            ThreePointArc((46.5, 18), (45.914213562, 19.414213562), (44.5, 20))
            Line((44.5, 20), (5, 20))
        make_face()
        with Locations((24.75, 10)):
            Circle(EDGE_FLANGE5_PROFILE_R, mode=Mode.SUBTRACT)
    extrude(amount=-EDGE_FLANGE5_FLAT_DEPTH)


solid = part.part
